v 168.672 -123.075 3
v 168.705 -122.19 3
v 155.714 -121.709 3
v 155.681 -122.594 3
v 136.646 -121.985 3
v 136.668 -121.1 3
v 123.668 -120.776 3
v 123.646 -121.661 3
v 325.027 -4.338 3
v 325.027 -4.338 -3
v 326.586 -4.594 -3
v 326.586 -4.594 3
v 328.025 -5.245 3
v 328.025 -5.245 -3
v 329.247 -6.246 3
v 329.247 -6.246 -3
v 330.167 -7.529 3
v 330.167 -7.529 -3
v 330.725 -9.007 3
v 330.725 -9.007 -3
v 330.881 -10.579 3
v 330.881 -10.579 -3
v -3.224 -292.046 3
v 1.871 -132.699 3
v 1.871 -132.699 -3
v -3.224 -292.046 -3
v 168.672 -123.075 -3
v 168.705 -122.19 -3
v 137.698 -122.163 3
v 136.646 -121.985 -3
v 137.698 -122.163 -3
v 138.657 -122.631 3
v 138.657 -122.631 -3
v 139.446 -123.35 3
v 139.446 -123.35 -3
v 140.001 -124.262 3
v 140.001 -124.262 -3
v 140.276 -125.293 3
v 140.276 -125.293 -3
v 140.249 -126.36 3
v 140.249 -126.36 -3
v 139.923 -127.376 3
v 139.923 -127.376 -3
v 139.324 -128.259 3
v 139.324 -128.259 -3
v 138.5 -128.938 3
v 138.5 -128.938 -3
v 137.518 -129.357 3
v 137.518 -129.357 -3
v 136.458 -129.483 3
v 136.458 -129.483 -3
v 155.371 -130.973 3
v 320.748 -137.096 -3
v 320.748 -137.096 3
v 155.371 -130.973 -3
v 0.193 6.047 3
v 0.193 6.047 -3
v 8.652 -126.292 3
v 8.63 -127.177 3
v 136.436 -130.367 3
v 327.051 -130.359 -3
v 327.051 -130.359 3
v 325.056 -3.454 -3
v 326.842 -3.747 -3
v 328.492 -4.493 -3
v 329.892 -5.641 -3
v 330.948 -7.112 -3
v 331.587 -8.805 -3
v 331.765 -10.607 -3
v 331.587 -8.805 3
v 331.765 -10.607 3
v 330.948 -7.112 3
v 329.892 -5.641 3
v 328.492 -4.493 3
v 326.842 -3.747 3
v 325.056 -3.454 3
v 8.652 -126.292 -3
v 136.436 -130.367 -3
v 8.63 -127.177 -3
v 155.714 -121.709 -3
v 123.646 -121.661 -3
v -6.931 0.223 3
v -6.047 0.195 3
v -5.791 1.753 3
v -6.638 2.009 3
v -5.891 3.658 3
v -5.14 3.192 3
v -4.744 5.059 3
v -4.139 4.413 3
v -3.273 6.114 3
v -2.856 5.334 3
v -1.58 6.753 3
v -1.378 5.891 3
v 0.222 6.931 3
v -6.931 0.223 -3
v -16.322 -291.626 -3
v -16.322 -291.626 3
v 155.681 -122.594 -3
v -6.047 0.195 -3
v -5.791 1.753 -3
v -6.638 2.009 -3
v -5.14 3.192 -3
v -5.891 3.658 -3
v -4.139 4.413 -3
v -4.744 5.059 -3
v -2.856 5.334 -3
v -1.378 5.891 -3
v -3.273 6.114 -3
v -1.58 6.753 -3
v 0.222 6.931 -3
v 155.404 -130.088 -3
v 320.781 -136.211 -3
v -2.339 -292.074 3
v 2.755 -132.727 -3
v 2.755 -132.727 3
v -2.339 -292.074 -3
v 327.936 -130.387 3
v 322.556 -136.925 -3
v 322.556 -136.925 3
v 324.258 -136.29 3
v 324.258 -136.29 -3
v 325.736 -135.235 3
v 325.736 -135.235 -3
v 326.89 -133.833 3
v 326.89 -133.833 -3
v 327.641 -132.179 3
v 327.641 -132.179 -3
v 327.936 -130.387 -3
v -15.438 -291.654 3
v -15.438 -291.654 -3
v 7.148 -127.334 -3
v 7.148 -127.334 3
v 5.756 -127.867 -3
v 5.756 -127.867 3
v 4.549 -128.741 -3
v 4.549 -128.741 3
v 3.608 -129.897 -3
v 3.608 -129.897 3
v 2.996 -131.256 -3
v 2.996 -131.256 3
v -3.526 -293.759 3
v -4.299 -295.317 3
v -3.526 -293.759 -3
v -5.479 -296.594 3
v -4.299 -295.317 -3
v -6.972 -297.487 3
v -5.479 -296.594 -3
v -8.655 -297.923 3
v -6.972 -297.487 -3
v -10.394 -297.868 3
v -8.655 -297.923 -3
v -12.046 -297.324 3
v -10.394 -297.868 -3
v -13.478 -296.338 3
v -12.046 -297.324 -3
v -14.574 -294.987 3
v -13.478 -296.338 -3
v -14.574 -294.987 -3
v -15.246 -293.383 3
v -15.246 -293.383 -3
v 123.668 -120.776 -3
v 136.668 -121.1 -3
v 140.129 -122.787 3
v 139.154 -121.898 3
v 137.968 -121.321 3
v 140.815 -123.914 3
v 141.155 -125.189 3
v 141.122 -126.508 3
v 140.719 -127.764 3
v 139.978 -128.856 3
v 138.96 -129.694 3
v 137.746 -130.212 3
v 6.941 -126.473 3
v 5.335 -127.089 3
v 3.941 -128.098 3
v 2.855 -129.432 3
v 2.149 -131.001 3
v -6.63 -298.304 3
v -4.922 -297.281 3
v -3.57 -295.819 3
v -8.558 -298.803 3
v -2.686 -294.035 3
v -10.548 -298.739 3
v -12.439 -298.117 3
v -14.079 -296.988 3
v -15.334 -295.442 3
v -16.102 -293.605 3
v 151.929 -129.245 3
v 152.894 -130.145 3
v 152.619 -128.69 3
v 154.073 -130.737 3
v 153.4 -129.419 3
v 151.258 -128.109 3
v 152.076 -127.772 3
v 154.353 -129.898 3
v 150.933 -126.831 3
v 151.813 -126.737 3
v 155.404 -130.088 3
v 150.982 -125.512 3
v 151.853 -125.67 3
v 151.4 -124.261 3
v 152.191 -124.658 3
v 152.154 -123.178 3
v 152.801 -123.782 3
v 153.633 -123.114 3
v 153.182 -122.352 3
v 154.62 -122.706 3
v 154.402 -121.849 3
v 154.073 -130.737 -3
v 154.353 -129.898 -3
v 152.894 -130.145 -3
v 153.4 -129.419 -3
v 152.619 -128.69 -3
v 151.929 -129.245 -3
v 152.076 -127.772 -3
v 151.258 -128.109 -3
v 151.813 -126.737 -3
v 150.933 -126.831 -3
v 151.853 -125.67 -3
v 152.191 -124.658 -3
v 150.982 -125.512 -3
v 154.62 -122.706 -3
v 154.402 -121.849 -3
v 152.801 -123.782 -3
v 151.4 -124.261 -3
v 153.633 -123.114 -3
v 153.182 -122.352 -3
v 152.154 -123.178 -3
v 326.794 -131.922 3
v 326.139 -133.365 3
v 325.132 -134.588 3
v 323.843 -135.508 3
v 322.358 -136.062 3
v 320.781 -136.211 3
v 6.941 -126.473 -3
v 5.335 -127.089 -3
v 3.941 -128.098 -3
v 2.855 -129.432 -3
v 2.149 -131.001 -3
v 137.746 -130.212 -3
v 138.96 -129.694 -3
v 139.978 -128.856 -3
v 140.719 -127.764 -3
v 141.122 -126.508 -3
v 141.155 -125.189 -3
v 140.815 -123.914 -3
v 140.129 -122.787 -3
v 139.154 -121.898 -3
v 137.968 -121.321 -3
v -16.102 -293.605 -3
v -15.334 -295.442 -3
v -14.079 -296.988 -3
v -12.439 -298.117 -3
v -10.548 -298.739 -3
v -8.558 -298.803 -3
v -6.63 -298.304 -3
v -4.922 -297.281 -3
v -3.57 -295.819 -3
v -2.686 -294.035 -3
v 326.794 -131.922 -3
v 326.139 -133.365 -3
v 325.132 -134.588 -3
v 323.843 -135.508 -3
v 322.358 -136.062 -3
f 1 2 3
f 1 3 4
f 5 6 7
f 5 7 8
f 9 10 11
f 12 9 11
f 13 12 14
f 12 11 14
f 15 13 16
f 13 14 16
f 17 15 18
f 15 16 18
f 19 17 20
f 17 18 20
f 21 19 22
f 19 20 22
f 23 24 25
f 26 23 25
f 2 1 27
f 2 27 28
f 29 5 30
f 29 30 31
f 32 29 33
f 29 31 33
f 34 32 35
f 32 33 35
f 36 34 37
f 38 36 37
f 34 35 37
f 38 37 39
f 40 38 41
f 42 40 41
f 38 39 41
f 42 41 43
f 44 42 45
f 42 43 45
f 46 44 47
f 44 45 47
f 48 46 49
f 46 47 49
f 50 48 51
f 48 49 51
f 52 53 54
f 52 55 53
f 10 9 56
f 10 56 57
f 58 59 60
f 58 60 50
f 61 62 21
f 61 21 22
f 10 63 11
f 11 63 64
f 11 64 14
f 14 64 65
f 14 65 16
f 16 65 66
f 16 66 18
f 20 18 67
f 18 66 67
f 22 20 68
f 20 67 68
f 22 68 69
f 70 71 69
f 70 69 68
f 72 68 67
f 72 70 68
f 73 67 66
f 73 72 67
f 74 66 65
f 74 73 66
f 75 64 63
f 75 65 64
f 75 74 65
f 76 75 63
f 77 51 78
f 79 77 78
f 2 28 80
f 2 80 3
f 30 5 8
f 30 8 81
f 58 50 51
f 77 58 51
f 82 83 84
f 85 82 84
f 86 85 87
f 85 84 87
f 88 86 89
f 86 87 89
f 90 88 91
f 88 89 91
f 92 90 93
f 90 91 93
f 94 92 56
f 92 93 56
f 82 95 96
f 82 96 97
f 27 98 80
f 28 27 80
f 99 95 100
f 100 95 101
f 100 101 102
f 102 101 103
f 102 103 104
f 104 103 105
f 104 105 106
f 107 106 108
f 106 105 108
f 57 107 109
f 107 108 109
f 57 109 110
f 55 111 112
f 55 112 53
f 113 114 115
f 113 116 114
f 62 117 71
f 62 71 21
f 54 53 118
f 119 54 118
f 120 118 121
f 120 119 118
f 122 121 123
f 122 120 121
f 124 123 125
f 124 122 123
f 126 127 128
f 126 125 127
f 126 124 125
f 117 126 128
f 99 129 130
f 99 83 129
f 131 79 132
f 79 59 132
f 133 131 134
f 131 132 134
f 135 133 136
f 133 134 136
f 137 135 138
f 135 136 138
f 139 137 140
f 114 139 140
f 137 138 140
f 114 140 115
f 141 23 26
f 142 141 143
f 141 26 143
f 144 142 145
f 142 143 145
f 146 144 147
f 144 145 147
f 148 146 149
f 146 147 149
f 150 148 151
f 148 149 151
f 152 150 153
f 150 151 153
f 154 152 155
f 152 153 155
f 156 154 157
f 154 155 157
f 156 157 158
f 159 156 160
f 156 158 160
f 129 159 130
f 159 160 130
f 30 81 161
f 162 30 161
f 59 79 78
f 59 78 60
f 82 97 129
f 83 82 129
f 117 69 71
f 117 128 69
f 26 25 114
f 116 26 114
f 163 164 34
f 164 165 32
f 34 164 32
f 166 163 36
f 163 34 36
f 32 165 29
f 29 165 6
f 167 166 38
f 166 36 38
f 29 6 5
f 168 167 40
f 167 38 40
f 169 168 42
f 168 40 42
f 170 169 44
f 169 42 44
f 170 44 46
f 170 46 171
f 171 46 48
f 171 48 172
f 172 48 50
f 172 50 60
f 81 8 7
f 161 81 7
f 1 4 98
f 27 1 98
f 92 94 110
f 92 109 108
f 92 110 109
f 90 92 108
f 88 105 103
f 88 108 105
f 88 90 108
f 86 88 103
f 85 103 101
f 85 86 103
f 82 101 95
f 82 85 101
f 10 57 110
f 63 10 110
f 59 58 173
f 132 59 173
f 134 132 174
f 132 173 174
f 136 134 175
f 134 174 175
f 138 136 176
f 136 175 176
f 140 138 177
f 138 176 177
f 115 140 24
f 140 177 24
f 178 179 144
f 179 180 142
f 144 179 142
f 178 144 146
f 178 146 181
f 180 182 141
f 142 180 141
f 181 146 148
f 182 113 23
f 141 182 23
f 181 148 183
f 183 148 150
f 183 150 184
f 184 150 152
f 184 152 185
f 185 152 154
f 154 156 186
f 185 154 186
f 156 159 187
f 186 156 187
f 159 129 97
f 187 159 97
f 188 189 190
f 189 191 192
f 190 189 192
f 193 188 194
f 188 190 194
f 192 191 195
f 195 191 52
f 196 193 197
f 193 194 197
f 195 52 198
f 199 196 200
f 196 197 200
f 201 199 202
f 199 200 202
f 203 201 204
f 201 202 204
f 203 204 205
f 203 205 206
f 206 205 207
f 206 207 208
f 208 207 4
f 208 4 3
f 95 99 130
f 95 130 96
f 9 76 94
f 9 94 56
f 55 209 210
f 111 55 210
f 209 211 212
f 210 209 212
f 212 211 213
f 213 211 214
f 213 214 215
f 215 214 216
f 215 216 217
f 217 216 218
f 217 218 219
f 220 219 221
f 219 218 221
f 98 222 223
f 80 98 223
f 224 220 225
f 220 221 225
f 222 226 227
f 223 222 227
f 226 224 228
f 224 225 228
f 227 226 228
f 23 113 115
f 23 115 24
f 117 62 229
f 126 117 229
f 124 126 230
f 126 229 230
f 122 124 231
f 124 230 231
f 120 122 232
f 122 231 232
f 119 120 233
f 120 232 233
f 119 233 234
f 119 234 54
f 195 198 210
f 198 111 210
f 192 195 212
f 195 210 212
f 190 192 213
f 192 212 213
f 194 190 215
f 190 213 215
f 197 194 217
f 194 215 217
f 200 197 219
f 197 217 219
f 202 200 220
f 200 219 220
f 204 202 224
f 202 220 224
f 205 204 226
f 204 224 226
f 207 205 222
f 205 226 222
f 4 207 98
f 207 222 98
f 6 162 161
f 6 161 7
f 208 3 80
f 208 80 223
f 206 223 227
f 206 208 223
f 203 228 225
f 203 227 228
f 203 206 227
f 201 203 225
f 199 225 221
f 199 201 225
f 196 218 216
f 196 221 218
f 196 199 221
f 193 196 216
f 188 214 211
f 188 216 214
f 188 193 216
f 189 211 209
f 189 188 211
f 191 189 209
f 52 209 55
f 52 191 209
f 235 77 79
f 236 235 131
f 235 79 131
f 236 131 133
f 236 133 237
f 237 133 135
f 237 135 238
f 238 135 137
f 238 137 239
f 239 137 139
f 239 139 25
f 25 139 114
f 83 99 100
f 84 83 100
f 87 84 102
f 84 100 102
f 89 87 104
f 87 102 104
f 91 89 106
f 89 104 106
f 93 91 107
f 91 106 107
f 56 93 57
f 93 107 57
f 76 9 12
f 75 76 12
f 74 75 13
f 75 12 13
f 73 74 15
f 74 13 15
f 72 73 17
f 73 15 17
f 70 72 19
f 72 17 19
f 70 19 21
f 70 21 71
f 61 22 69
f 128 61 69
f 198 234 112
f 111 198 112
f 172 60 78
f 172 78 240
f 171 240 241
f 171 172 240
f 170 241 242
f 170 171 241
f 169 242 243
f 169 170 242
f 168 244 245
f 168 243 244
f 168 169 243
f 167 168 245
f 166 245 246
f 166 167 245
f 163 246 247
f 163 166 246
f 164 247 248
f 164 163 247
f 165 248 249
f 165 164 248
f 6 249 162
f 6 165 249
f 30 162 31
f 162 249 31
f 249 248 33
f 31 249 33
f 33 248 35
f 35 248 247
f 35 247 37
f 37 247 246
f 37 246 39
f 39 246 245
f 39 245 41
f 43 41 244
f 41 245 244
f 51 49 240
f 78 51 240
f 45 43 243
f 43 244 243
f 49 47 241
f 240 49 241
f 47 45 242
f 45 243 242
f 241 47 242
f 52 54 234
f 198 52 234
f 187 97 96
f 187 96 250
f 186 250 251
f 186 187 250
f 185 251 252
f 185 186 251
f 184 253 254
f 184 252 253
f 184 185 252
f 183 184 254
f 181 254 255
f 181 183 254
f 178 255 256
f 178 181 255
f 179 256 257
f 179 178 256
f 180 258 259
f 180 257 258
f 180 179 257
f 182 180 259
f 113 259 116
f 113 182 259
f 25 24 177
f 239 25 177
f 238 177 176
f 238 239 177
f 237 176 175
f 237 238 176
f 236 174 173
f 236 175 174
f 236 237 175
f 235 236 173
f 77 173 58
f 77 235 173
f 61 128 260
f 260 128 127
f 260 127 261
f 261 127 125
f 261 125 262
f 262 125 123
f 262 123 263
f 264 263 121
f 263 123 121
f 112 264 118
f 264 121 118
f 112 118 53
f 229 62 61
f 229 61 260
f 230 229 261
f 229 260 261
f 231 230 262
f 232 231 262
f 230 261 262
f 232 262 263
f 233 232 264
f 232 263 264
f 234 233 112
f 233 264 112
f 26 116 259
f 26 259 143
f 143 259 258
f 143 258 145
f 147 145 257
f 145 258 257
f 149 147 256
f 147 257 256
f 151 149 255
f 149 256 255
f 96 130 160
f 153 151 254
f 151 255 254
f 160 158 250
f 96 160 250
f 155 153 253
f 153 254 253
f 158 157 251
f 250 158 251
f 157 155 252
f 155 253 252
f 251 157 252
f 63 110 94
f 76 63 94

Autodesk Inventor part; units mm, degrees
ref_plane "YZ Plane" through (0, 0, 0) normal (1, 0, 0) x (0, 1, 0)
ref_plane "XZ Plane" through (0, 0, 0) normal (0, 1, 0) x (-1, 0, 0)
sketch "Sketch1" plane through (0, 0, 0) normal (0, 0, 1) x (1, 0, 0)
  circle A0 centre (0, 0) radius 6.05
surface extrude "ExtrusionSrf1" sketch "Sketch1" along normal mid plane 6 shown yes curves A0
sketch "Sketch2" plane through (0, 0, 0) normal (0, 0, 1) x (1, 0, 0)
  circle A0 centre (324.834, -10.3853) radius 6.05
  point P0 (0, 0)
surface extrude "ExtrusionSrf2" sketch "Sketch2" along normal mid plane 6 shown yes curves A0
sketch "Sketch3" plane through (0, 0, 0) normal (0, 0, 1) x (1, 0, 0)
  circle A0 centre (-9.3308, -291.8509) radius 6.11
  point P0 (0, 0)
surface extrude "ExtrusionSrf3" sketch "Sketch3" along normal blind 6 shown yes curves A0
sketch "Sketch4" plane through (0, 0, 0) normal (0, 0, 1) x (1, 0, 0)
  circle A0 centre (8.4872, -132.9103) radius 5.735
  point P0 (0, 0)
surface extrude "ExtrusionSrf4" sketch "Sketch4" along normal mid plane 6 shown yes curves A0
sketch "Sketch5" plane through (0, 0, 0) normal (0, 0, 1) x (1, 0, 0)
  circle A0 centre (321.0045, -130.1653) radius 6.05
  point P0 (0, 0)
surface extrude "ExtrusionSrf5" sketch "Sketch5" along normal mid plane 6 shown yes curves A0
sketch "Sketch6" plane through (0, 0, 0) normal (0, 0, 1) x (1, 0, 0)
  circle A0 centre (136.5519, -125.7339) radius 3
  point P0 (0, 0)
surface extrude "ExtrusionSrf6" sketch "Sketch6" along normal mid plane 6 shown yes curves A0
sketch "Sketch7" plane through (0, 0, 0) normal (0, 0, 1) x (1, 0, 0)
  circle A0 centre (155.5422, -126.341) radius 3
  point P0 (0, 0)
surface extrude "ExtrusionSrf7" sketch "Sketch7" along normal mid plane 6 shown yes curves A0
sketch "Sketch8" plane through (0, 0, 0) normal (0, 0, 1) x (1, 0, 0)
  circle A0 centre (0, 0) radius 6.05 projected
  circle A1 centre (8.4872, -132.9103) radius 5.735 projected
  circle A2 centre (-9.3308, -291.8509) radius 6.11 projected
  circle A3 centre (136.5519, -125.7339) radius 3 projected
  circle A4 centre (155.5422, -126.341) radius 3 projected
  circle A5 centre (321.0045, -130.1653) radius 6.05 projected
  circle A6 centre (324.834, -10.3853) radius 6.05 projected
  arc A7 (0.2015, 6.3018) -> (-6.3017, 0.2028) centre (0, 0) ccw
  arc A8 (-15.6925, -291.6462) -> (-2.969, -292.0543) centre (-9.3308, -291.8509) ccw
  arc A9 (8.6461, -126.5472) -> (2.1255, -132.7069) centre (8.4872, -132.9103) ccw
  arc A10 (136.452, -129.7376) -> (136.6519, -121.7301) centre (136.5519, -125.7339) ccw
  arc A11 (331.1358, -10.5868) -> (325.0355, -4.0835) centre (324.834, -10.3853) ccw
  arc A12 (155.6904, -122.3388) -> (155.3941, -130.3433) centre (155.5422, -126.341) ccw
  arc A13 (320.7713, -136.466) -> (327.3063, -130.3668) centre (321.0045, -130.1653) ccw
  line L0 (-15.6925, -291.6462) -> (-6.3017, 0.2028)
  line L1 (0.2015, 6.3018) -> (325.0355, -4.0835)
  line L2 (-2.969, -292.0543) -> (2.1255, -132.7069)
  line L3 (8.6461, -126.5472) -> (136.452, -129.7376)
  line L4 (331.1358, -10.5868) -> (327.3063, -130.3668)
  line L5 (123.6519, -121.4056) -> (136.6519, -121.7301)
  line L6 (155.3941, -130.3433) -> (320.7713, -136.466)
  line L7 (155.6904, -122.3388) -> (168.6815, -122.8197)
  dimension "d14" = 0.255
  dimension "d15" = 0.255
  dimension "d16" = 0.255
  dimension "d17" = 0.63
  dimension "d19" = 0.255
  dimension "d22" = 1.005
  dimension "d23" = 1.005
  dimension "d34" = 13
  dimension "d35" = 13
ref_plane "Work Plane2" through (168.6815, -122.8197, 0) normal (0.9993154, -0.0369972, 0) x (0.0369972, 0.9993154, 0)
sketch "Sketch10" plane through (168.6815, -122.8197, 0) normal (0.9993154, -0.0369972, 0) x (0.0369972, 0.9993154, 0)
  line L0 (0.63, 3) -> (-0.255, 3)
  line L1 (-0.255, 3) -> (-0.255, -3)
  line L2 (-0.255, -3) -> (0.63, -3)
  line L3 (0.63, -3) -> (0.63, 3)
  line L4 (0.63, 0) -> (-0.255, 0) construction
  point P0 (116.4949, 0)
  point P1 (0, 0)
  dimension "d29" = 6
  dimension "d30" = 0.63
  dimension "d31" = 0.255
sweep "Sweep2" add profiles "Sketch10" path "Sketch8" path curves L7 A12 L6 A13 L4 A11 L1 A7 L0 A8 L2 A9 L3 A10 L5
equation "\"d14\" = inside"
equation "\"d15\" = inside"
equation "\"d16\" = inside"
equation "\"d17\" = backside"
equation "\"d19\" = inside"
equation "\"d30\" = backside"
equation "\"d31\" = inside"
equation "\"inside\" = 0.255"
equation "\"backside\" = 0.63"
properties part number "Belt 3" material "Rubber"
